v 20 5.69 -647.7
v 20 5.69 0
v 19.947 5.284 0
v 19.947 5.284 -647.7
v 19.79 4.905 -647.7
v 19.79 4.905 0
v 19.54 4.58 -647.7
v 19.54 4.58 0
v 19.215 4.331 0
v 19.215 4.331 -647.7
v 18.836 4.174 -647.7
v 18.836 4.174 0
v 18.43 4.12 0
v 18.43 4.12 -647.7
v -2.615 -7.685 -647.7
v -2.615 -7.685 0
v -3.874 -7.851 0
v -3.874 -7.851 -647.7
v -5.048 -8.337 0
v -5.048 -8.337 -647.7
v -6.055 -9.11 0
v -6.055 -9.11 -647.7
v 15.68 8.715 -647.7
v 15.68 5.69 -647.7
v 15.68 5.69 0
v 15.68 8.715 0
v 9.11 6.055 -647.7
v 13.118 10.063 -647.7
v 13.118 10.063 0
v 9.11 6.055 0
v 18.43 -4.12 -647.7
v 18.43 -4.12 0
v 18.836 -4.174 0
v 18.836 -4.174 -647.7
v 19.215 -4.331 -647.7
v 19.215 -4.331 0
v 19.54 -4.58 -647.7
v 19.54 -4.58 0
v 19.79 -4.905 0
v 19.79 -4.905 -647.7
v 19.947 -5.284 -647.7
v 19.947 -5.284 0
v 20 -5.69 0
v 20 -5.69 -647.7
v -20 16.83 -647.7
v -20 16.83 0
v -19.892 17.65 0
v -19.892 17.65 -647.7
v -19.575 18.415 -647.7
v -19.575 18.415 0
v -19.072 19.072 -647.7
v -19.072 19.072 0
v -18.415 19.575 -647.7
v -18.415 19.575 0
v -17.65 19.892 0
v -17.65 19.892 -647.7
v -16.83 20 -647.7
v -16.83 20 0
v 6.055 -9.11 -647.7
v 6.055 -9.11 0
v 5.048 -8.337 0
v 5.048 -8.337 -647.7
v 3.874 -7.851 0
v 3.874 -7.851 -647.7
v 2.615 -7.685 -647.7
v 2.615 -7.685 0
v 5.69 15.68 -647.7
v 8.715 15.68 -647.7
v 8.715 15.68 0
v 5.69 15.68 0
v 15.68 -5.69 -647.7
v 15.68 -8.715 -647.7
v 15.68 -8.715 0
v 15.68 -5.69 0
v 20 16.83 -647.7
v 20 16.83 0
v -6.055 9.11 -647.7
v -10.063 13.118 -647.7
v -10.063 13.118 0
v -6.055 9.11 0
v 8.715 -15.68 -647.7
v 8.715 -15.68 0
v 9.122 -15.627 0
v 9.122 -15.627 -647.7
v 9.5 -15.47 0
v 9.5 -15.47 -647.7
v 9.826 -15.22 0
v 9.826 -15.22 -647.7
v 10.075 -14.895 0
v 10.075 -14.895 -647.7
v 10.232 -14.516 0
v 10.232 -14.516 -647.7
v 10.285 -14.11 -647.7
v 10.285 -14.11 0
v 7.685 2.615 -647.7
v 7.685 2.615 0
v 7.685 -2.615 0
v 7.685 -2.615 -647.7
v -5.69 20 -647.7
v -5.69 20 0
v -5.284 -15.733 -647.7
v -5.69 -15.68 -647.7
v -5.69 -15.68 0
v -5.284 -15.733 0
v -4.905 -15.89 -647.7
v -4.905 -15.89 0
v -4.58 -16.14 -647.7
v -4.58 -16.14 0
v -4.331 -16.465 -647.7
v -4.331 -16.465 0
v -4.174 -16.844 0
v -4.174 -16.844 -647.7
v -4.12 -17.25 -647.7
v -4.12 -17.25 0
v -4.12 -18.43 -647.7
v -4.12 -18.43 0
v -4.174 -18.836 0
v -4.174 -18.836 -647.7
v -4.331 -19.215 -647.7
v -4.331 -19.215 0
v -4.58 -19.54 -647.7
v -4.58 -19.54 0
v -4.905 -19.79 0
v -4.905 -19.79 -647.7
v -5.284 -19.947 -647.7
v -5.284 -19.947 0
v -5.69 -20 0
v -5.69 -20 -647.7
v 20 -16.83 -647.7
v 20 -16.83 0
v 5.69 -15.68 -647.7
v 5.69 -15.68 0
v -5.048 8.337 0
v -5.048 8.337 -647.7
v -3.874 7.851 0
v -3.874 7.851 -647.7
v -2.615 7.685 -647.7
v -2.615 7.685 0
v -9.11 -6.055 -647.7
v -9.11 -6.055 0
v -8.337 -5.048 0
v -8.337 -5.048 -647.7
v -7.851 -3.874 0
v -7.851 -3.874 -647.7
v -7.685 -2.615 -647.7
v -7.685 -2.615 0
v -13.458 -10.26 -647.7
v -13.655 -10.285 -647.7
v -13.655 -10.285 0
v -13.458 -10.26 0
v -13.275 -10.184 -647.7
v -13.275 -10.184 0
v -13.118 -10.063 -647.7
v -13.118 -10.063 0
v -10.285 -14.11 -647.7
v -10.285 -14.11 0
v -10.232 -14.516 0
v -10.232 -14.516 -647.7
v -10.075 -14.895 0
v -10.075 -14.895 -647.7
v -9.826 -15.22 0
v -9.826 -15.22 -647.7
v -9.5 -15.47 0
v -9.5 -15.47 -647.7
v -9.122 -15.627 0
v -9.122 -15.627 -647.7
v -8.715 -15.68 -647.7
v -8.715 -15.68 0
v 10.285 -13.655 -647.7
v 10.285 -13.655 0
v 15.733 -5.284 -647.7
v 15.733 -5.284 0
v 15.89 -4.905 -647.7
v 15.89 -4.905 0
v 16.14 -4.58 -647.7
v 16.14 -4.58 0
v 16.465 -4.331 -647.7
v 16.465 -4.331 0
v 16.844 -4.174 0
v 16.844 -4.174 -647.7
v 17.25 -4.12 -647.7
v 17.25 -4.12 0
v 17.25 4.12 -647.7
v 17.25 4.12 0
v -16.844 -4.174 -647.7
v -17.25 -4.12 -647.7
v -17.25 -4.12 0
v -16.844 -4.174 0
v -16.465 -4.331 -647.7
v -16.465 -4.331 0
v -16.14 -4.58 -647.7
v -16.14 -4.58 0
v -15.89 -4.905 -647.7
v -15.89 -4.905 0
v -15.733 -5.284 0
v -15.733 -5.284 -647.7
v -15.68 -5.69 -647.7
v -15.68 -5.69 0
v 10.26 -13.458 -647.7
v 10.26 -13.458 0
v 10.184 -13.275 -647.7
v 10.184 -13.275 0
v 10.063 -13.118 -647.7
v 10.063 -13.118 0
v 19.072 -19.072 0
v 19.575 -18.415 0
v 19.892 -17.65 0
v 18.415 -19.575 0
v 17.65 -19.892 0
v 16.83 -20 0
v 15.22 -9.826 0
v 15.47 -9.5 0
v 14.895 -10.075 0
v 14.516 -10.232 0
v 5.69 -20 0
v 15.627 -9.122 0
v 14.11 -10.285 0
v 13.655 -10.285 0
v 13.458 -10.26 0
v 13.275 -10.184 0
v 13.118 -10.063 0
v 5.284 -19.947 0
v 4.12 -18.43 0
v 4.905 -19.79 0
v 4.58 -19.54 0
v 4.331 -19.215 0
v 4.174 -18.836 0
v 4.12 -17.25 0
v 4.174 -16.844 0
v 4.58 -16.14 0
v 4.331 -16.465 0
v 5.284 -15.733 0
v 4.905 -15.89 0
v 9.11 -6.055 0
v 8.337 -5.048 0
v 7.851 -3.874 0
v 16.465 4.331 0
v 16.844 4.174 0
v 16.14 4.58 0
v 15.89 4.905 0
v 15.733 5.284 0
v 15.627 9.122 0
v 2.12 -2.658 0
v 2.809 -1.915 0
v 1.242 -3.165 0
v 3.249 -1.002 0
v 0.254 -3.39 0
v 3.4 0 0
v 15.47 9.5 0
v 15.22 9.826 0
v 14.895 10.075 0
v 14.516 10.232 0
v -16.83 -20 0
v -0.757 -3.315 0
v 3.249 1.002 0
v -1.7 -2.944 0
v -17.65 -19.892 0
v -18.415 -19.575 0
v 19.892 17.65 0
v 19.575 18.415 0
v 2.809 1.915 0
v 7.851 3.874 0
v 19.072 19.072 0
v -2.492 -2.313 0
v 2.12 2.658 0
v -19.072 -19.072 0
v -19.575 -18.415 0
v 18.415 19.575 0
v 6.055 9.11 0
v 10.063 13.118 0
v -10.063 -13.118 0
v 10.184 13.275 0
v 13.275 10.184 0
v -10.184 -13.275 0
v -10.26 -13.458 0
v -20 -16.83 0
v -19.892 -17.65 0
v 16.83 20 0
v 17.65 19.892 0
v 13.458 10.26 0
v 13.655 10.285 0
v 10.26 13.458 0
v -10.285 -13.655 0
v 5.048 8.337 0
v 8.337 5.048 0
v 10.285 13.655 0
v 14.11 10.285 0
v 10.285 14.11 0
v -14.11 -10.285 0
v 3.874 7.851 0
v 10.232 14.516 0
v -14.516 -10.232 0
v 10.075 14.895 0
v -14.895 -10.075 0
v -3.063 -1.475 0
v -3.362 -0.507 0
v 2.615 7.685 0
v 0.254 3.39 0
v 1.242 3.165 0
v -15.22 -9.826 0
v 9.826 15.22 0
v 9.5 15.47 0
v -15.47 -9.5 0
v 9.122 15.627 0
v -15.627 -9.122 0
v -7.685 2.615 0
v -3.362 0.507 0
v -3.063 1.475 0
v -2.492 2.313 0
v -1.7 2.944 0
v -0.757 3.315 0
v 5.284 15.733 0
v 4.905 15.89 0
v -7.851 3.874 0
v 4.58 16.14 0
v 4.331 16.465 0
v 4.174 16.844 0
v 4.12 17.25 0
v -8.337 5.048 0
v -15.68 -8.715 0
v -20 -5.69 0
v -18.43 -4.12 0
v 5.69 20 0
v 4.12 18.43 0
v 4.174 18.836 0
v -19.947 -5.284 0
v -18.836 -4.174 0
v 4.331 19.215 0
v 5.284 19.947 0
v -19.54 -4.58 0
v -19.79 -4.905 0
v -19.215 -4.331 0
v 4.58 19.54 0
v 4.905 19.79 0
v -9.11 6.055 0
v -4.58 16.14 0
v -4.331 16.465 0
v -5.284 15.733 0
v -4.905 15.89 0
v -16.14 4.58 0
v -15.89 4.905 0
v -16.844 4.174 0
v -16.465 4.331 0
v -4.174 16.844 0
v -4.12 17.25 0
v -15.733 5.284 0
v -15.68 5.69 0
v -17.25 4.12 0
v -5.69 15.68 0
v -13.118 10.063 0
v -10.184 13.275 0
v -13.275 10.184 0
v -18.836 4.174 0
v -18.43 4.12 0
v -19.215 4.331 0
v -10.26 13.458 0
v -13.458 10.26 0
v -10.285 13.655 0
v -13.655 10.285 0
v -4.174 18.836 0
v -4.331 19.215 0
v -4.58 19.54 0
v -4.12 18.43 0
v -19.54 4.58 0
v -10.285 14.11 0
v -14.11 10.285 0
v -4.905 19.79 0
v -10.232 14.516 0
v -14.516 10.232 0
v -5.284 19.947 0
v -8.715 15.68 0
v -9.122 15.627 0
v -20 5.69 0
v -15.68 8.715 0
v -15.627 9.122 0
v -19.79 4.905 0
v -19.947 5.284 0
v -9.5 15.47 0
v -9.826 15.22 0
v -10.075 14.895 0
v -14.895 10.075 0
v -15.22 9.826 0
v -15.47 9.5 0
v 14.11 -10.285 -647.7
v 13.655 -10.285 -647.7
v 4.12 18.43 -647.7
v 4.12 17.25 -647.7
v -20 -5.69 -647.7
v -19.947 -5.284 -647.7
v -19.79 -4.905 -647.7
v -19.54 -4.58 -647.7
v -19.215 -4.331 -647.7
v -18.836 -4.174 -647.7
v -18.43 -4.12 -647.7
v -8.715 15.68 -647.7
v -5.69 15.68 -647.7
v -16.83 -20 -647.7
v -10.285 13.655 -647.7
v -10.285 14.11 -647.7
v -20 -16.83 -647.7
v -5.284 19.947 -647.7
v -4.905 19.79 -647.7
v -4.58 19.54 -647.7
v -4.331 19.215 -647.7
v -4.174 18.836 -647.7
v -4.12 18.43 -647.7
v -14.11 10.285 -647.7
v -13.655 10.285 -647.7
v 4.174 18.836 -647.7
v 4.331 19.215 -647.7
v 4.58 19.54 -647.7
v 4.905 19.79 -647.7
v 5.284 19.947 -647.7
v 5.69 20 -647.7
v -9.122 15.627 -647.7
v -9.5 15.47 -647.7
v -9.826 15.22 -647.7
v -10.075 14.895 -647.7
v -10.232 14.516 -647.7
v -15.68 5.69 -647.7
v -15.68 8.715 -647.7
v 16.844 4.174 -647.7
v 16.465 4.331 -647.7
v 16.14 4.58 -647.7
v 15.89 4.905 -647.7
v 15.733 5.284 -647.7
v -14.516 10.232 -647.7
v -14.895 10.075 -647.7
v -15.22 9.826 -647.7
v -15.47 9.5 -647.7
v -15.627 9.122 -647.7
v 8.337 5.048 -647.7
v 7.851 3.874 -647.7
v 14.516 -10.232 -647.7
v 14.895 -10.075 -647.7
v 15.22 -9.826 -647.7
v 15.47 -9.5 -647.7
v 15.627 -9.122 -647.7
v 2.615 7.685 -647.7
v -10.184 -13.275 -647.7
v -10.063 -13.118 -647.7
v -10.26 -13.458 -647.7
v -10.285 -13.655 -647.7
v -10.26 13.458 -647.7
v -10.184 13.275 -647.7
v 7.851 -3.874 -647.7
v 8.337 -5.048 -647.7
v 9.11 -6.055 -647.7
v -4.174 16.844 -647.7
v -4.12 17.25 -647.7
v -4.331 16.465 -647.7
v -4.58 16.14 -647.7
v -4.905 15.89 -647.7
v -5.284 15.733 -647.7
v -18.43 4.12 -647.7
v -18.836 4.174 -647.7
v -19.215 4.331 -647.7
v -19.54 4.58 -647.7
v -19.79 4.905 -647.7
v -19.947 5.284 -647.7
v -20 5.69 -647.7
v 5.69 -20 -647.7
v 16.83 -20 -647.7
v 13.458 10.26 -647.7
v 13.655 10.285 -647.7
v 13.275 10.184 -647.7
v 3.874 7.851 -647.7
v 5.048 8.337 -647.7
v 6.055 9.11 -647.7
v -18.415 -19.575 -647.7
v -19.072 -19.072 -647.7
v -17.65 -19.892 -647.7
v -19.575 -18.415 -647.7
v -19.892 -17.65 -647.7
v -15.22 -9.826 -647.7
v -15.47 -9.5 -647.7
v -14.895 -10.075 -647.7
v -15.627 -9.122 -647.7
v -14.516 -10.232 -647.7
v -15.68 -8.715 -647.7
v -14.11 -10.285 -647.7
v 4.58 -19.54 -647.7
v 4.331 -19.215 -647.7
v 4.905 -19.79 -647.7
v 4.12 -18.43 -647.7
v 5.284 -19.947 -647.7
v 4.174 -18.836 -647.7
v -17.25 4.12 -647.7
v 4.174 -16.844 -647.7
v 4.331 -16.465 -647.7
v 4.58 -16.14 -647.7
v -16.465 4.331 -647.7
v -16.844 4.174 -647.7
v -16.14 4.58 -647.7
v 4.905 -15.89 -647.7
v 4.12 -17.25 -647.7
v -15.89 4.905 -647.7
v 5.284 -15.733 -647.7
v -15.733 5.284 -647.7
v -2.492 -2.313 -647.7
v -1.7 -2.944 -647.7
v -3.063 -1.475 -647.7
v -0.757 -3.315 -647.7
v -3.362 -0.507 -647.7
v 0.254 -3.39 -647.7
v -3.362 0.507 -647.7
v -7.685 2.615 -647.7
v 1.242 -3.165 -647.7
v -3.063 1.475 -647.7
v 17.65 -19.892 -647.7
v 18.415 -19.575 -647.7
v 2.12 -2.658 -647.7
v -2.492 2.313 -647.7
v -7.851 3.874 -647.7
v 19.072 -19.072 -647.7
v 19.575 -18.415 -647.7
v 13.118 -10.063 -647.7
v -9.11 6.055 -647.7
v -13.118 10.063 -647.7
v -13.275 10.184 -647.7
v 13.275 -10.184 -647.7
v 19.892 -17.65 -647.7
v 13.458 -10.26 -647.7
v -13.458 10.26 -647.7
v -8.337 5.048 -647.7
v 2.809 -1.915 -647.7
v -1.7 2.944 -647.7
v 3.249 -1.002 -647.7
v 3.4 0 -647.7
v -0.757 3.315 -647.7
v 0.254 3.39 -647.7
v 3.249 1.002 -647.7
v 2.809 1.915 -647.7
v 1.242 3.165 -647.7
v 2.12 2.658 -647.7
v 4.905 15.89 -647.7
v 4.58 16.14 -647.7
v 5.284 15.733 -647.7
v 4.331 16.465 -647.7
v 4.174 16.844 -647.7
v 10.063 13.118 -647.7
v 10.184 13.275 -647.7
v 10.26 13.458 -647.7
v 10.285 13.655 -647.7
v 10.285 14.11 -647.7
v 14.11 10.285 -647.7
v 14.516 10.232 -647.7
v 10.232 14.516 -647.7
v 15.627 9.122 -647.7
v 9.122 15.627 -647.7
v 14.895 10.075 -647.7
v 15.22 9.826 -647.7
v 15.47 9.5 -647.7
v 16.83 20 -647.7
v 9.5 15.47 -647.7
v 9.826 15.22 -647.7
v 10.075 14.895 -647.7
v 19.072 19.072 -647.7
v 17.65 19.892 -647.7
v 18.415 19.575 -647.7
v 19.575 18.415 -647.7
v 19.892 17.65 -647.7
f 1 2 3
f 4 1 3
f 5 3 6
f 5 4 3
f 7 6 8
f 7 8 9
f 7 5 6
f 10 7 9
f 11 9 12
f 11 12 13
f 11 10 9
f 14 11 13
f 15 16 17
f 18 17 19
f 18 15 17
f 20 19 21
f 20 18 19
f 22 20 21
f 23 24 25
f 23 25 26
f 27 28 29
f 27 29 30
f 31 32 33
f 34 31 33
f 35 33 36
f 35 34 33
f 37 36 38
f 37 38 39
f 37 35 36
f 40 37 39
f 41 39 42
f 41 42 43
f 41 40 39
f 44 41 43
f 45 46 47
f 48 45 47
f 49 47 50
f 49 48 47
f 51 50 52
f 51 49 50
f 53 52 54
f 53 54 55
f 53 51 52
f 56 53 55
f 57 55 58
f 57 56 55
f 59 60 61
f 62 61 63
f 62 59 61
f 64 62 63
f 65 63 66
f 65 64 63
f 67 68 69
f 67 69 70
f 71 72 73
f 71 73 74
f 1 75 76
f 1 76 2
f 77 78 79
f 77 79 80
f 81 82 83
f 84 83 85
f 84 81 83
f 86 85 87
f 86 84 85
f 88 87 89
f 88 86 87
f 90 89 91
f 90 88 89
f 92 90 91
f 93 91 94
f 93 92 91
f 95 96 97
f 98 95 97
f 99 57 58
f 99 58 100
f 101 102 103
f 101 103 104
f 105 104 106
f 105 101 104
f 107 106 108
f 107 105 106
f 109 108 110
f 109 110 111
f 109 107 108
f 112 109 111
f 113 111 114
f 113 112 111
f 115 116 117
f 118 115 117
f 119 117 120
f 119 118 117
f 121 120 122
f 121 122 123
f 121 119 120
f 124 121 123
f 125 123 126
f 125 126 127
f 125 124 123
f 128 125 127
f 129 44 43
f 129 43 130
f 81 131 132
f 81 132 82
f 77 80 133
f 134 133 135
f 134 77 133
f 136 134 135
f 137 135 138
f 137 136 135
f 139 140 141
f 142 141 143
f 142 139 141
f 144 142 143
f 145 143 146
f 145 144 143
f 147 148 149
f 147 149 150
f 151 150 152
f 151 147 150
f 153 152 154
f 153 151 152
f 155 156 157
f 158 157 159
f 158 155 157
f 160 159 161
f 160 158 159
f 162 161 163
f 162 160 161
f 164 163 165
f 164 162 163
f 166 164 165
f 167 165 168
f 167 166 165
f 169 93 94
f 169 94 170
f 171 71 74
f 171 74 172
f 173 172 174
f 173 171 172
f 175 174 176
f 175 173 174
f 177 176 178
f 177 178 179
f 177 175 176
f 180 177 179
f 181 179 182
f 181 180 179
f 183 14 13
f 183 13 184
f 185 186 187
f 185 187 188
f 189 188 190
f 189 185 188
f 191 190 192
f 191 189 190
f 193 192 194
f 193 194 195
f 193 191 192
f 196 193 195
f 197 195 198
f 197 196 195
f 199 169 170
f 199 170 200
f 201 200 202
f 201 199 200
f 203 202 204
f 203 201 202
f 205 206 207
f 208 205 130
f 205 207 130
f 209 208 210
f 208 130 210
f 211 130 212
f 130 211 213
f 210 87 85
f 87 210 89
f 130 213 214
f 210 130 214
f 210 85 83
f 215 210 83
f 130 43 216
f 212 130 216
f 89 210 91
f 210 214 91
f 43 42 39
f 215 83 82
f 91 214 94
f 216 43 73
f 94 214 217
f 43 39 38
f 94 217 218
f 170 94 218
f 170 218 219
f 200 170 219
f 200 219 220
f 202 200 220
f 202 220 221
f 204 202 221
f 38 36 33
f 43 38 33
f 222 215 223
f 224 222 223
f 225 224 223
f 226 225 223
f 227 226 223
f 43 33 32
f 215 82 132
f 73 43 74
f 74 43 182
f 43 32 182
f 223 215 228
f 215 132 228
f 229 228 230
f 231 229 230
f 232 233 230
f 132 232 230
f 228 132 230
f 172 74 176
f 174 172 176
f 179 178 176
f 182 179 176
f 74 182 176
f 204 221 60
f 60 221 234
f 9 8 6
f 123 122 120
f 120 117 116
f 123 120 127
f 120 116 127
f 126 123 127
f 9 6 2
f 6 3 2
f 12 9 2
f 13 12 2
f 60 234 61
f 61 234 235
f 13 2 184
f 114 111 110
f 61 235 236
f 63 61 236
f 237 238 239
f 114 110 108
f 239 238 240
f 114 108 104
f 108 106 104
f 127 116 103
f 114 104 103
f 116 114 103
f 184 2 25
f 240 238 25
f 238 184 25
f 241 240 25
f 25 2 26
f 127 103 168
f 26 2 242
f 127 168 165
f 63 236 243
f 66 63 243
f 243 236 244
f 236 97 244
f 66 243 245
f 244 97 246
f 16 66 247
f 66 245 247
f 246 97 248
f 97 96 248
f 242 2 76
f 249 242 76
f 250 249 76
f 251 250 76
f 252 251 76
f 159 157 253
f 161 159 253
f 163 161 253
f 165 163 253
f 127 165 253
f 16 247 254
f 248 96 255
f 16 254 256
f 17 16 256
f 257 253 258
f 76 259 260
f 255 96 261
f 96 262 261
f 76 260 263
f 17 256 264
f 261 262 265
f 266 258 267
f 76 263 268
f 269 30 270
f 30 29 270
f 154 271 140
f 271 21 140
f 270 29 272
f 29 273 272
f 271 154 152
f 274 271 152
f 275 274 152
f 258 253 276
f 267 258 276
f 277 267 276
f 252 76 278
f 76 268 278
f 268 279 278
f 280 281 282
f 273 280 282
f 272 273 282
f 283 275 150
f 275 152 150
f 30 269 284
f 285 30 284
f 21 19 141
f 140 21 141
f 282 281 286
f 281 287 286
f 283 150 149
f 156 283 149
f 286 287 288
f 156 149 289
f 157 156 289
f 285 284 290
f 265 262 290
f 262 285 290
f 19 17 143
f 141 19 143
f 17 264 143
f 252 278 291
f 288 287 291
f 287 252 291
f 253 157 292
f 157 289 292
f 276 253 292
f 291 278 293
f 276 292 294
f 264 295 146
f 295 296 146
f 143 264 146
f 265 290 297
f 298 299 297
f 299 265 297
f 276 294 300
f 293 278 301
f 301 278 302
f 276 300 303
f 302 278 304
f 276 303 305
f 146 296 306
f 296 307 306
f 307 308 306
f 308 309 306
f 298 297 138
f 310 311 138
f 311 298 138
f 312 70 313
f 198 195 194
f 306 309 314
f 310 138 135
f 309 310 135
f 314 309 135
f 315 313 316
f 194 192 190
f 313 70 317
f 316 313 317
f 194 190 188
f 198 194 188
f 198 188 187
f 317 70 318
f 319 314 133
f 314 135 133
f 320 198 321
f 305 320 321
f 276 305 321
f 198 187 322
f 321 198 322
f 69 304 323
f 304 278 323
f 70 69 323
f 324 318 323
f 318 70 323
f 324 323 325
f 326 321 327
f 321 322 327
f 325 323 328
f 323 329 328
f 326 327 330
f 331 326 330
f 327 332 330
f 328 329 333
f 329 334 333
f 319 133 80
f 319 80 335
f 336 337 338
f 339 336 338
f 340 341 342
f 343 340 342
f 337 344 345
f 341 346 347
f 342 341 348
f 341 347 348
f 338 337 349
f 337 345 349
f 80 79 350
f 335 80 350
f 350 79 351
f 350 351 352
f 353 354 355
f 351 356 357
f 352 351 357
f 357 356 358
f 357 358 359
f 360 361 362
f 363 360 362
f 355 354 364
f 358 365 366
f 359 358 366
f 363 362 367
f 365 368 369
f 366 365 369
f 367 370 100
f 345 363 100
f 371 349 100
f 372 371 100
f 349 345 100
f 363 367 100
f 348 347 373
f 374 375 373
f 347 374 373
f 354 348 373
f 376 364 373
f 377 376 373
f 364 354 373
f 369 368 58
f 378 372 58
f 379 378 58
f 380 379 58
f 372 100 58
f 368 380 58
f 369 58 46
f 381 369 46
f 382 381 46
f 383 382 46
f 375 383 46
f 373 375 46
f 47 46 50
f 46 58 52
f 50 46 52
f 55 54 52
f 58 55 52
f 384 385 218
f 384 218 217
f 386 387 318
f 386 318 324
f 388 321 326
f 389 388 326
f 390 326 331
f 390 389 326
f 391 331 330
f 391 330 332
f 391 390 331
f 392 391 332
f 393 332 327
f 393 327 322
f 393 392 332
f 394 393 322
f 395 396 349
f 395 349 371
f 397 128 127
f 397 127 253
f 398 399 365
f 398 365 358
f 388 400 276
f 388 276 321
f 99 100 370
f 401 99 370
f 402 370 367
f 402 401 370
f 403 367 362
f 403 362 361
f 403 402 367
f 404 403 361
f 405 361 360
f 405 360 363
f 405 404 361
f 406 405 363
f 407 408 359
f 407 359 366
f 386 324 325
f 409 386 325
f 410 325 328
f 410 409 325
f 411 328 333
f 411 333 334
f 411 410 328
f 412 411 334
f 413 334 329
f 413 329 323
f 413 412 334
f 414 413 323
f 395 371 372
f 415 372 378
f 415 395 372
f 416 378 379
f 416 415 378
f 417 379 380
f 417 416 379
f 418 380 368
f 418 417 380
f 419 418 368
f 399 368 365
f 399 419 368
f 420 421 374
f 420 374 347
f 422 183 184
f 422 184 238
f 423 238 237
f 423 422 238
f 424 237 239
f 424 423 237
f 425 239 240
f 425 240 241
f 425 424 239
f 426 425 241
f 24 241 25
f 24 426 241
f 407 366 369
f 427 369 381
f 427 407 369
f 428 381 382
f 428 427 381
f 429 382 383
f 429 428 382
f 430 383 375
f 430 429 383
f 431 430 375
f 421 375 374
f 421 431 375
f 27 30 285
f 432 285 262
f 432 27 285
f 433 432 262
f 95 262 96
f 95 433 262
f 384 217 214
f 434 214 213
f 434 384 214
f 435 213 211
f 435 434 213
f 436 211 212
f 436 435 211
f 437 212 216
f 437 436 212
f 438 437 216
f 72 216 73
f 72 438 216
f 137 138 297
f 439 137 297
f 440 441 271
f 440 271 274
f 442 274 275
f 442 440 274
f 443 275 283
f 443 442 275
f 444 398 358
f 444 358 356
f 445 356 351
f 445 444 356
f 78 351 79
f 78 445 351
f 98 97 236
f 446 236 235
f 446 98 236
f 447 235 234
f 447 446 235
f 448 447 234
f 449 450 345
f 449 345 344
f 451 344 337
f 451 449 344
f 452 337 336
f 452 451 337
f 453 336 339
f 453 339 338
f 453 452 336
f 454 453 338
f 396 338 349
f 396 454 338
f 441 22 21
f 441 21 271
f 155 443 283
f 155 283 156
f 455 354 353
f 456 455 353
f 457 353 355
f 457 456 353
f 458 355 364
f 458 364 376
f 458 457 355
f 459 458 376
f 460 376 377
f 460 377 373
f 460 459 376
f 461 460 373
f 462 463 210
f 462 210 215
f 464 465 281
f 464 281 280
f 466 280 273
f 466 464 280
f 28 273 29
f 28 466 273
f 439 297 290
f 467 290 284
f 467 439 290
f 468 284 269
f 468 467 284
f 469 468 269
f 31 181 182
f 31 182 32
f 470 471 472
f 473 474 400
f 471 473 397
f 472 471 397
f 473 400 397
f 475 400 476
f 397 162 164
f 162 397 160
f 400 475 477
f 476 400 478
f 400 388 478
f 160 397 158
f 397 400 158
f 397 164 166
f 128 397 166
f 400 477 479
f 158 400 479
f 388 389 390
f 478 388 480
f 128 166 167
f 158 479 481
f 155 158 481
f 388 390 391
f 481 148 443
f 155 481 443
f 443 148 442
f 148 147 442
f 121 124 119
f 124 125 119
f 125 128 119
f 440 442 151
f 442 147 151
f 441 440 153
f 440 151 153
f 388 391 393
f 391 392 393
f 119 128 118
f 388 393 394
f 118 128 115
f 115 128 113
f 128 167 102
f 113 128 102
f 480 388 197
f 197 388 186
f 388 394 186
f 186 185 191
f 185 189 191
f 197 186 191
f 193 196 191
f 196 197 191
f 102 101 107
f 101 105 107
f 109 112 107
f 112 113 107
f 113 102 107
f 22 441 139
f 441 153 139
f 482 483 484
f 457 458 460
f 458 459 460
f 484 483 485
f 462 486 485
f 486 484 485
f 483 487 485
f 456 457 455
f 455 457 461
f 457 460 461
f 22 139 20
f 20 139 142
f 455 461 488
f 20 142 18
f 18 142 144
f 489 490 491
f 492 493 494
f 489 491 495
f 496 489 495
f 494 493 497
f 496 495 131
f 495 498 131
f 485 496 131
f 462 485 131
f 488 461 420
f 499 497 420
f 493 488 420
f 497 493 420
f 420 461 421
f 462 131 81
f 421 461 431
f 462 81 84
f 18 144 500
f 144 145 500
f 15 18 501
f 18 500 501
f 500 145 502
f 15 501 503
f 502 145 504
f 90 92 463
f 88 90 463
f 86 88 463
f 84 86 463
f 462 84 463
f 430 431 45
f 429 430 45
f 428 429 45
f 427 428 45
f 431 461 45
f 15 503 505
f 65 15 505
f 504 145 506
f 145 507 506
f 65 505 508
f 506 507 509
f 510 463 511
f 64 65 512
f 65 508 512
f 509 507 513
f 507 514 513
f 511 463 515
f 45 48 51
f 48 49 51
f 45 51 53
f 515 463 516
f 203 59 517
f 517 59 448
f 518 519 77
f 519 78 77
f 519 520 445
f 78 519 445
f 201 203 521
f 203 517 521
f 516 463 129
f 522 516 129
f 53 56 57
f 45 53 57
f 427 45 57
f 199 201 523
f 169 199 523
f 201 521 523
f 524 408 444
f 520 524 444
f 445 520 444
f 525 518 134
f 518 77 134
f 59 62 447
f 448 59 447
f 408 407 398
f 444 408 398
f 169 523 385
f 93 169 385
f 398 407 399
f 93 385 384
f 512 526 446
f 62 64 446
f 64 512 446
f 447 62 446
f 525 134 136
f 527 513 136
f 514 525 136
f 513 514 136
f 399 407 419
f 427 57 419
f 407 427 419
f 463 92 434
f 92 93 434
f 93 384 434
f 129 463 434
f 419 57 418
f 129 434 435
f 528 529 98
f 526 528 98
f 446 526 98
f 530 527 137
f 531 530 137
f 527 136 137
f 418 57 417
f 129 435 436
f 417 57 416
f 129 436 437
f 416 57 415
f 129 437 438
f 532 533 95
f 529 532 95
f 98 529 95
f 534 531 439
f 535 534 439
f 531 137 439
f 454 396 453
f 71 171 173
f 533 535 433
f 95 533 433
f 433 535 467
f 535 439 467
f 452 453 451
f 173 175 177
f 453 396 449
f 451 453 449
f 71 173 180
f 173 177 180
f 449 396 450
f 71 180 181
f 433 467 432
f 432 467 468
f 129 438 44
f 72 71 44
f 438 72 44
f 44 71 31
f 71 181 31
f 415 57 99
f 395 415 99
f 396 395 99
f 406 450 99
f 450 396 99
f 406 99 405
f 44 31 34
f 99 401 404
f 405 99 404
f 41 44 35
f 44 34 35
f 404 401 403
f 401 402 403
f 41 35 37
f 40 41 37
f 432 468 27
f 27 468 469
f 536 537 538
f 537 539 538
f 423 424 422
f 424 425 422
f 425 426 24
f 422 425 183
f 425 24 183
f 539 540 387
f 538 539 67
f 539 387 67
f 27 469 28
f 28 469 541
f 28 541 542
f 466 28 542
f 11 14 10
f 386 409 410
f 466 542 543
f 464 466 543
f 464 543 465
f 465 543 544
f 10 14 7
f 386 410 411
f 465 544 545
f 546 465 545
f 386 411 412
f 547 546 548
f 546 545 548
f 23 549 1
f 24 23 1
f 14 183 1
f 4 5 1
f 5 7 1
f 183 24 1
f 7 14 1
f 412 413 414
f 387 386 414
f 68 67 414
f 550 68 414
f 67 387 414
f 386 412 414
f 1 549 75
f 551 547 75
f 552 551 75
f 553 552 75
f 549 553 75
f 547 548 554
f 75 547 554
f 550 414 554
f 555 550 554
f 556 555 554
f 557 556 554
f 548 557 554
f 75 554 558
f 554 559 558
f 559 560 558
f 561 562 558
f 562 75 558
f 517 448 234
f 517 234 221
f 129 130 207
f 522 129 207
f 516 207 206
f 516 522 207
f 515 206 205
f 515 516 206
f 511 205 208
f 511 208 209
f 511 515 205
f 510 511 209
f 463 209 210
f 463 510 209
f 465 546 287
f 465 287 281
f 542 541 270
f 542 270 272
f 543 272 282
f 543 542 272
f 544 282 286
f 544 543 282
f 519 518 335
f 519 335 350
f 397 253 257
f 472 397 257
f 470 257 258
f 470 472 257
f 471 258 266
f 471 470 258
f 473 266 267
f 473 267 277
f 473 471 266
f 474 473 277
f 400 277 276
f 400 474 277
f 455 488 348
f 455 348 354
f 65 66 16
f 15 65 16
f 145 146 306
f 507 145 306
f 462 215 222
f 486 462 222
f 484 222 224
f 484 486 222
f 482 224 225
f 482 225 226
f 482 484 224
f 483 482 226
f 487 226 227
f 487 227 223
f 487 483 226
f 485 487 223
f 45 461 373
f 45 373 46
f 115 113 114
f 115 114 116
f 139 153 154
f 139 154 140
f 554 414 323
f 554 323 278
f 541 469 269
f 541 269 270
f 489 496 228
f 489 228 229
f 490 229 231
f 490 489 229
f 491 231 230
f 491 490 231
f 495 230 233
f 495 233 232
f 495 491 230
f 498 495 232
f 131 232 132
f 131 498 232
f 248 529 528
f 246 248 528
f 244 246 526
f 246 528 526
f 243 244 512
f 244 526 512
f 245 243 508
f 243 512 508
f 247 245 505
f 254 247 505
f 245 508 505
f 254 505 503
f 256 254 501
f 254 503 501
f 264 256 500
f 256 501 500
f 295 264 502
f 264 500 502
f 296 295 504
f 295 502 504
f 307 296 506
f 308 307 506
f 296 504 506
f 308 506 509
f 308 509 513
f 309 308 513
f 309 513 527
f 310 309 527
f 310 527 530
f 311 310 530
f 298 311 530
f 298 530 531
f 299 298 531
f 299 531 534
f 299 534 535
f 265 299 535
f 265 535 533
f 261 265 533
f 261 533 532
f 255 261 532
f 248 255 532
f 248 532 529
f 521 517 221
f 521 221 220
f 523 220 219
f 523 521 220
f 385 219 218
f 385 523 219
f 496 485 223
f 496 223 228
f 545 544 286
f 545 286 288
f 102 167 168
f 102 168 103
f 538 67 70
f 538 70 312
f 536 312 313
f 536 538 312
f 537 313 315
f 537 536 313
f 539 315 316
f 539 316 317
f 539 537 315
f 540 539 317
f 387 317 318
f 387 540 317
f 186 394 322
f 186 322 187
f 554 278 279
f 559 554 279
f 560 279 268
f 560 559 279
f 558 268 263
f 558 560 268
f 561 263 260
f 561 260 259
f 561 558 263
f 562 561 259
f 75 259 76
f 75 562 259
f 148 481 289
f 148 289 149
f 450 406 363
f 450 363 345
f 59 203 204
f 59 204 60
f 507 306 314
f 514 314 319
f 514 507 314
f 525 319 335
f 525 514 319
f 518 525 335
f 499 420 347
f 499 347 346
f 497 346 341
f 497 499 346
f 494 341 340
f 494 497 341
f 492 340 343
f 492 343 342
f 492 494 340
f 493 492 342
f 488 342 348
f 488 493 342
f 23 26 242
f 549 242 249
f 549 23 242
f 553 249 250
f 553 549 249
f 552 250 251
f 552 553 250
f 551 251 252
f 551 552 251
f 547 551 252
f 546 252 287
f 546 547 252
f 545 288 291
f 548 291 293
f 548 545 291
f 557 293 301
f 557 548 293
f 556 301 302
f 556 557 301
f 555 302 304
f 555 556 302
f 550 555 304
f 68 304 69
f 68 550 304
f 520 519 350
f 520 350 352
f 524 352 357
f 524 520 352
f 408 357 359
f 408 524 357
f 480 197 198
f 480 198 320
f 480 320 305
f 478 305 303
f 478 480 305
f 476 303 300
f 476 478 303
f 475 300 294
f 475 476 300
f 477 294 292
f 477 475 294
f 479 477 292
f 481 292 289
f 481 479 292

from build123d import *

# Parameters (mm, degrees)
SKETCH1_R           = 3.4
BOSS_EXTRUDE1_DEPTH = 4000
SKETCH2_W           = 240.449275058
SKETCH2_H           = 182.715753948
CUT_EXTRUDE1_DEPTH  = 3353.41931894


with BuildPart() as part:
    # Sketch1 → Boss-Extrude1 (new body)
    with BuildSketch(Plane(origin=(0, 0, -4000), x_dir=(-1, 0, 0), z_dir=(0, 0, -1))):
        with BuildLine():
            Line((16.83, 20), (5.69044933, 20))
            ThreePointArc((5.69044933, 20), (4.580291684, 19.540157646), (4.12044933, 18.43))
            Line((4.12044933, 18.43), (4.12044933, 17.25))
            ThreePointArc((4.12044933, 17.25), (4.580291684, 16.139842354), (5.69044933, 15.68))
            Line((5.69044933, 15.68), (8.7153995, 15.68))
            ThreePointArc((8.7153995, 15.68), (9.825557146, 15.220157646), (10.2853995, 14.11))
            Line((10.2853995, 14.11), (10.2853995, 13.654903102))
            ThreePointArc((10.2853995, 13.654903102), (10.227547945, 13.364063694), (10.062800654, 13.117501948))
            Line((10.062800654, 13.117501948), (6.055092794, 9.109794088))
            ThreePointArc((6.055092794, 9.109794088), (4.47691877, 8.055291919), (2.615335582, 7.685))
            Line((2.615335582, 7.685), (-2.615335582, 7.685))
            ThreePointArc((-2.615335582, 7.685), (-4.47691877, 8.055291919), (-6.055092794, 9.109794088))
            Line((-6.055092794, 9.109794088), (-10.062800654, 13.117501948))
            ThreePointArc((-10.062800654, 13.117501948), (-10.227547945, 13.364063694), (-10.2853995, 13.654903102))
            Line((-10.2853995, 13.654903102), (-10.2853995, 14.11))
            ThreePointArc((-10.2853995, 14.11), (-9.825557146, 15.220157646), (-8.7153995, 15.68))
            Line((-8.7153995, 15.68), (-5.69044933, 15.68))
            ThreePointArc((-5.69044933, 15.68), (-4.580291684, 16.139842354), (-4.12044933, 17.25))
            Line((-4.12044933, 17.25), (-4.12044933, 18.43))
            ThreePointArc((-4.12044933, 18.43), (-4.580291684, 19.540157646), (-5.69044933, 20))
            Line((-5.69044933, 20), (-16.83, 20))
            ThreePointArc((-16.83, 20), (-19.071528496, 19.071528496), (-20, 16.83))
            Line((-20, 16.83), (-20, 5.69044933))
            ThreePointArc((-20, 5.69044933), (-19.540157646, 4.580291684), (-18.43, 4.12044933))
            Line((-18.43, 4.12044933), (-17.25, 4.12044933))
            ThreePointArc((-17.25, 4.12044933), (-16.139842354, 4.580291684), (-15.68, 5.69044933))
            Line((-15.68, 5.69044933), (-15.68, 8.7153995))
            ThreePointArc((-15.68, 8.7153995), (-15.220157646, 9.825557146), (-14.11, 10.2853995))
            Line((-14.11, 10.2853995), (-13.654903102, 10.2853995))
            ThreePointArc((-13.654903102, 10.2853995), (-13.364063694, 10.227547945), (-13.117501948, 10.062800654))
            Line((-13.117501948, 10.062800654), (-9.109794088, 6.055092794))
            ThreePointArc((-9.109794088, 6.055092794), (-8.055291919, 4.47691877), (-7.685, 2.615335582))
            Line((-7.685, 2.615335582), (-7.685, -2.615335582))
            ThreePointArc((-7.685, -2.615335582), (-8.055291919, -4.47691877), (-9.109794088, -6.055092794))
            Line((-9.109794088, -6.055092794), (-13.117501948, -10.062800654))
            ThreePointArc((-13.117501948, -10.062800654), (-13.364063694, -10.227547945), (-13.654903102, -10.2853995))
            Line((-13.654903102, -10.2853995), (-14.11, -10.2853995))
            ThreePointArc((-14.11, -10.2853995), (-15.220157646, -9.825557146), (-15.68, -8.7153995))
            Line((-15.68, -8.7153995), (-15.68, -5.69044933))
            ThreePointArc((-15.68, -5.69044933), (-16.139842354, -4.580291684), (-17.25, -4.12044933))
            Line((-17.25, -4.12044933), (-18.43, -4.12044933))
            ThreePointArc((-18.43, -4.12044933), (-19.540157646, -4.580291684), (-20, -5.69044933))
            Line((-20, -5.69044933), (-20, -16.83))
            ThreePointArc((-20, -16.83), (-19.071528496, -19.071528496), (-16.83, -20))
            Line((-16.83, -20), (-5.69044933, -20))
            ThreePointArc((-5.69044933, -20), (-4.580291684, -19.540157646), (-4.12044933, -18.43))
            Line((-4.12044933, -18.43), (-4.12044933, -17.25))
            ThreePointArc((-4.12044933, -17.25), (-4.580291684, -16.139842354), (-5.69044933, -15.68))
            Line((-5.69044933, -15.68), (-8.7153995, -15.68))
            ThreePointArc((-8.7153995, -15.68), (-9.825557146, -15.220157646), (-10.2853995, -14.11))
            Line((-10.2853995, -14.11), (-10.2853995, -13.654903102))
            ThreePointArc((-10.2853995, -13.654903102), (-10.227547945, -13.364063694), (-10.062800654, -13.117501948))
            Line((-10.062800654, -13.117501948), (-6.055092794, -9.109794088))
            ThreePointArc((-6.055092794, -9.109794088), (-4.47691877, -8.055291919), (-2.615335582, -7.685))
            Line((-2.615335582, -7.685), (2.615335582, -7.685))
            ThreePointArc((2.615335582, -7.685), (4.47691877, -8.055291919), (6.055092794, -9.109794088))
            Line((6.055092794, -9.109794088), (10.062800654, -13.117501948))
            ThreePointArc((10.062800654, -13.117501948), (10.227547945, -13.364063694), (10.2853995, -13.654903102))
            Line((10.2853995, -13.654903102), (10.2853995, -14.11))
            ThreePointArc((10.2853995, -14.11), (9.825557146, -15.220157646), (8.7153995, -15.68))
            Line((8.7153995, -15.68), (5.69044933, -15.68))
            ThreePointArc((5.69044933, -15.68), (4.580291684, -16.139842354), (4.12044933, -17.25))
            Line((4.12044933, -17.25), (4.12044933, -18.43))
            ThreePointArc((4.12044933, -18.43), (4.580291684, -19.540157646), (5.69044933, -20))
            Line((5.69044933, -20), (16.83, -20))
            ThreePointArc((16.83, -20), (19.071528496, -19.071528496), (20, -16.83))
            Line((20, -16.83), (20, -5.69044933))
            ThreePointArc((20, -5.69044933), (19.540157646, -4.580291684), (18.43, -4.12044933))
            Line((18.43, -4.12044933), (17.25, -4.12044933))
            ThreePointArc((17.25, -4.12044933), (16.139842354, -4.580291684), (15.68, -5.69044933))
            Line((15.68, -5.69044933), (15.68, -8.7153995))
            ThreePointArc((15.68, -8.7153995), (15.220157646, -9.825557146), (14.11, -10.2853995))
            Line((14.11, -10.2853995), (13.654903102, -10.2853995))
            ThreePointArc((13.654903102, -10.2853995), (13.364063694, -10.227547945), (13.117501948, -10.062800654))
            Line((13.117501948, -10.062800654), (9.109794088, -6.055092794))
            ThreePointArc((9.109794088, -6.055092794), (8.055291919, -4.47691877), (7.685, -2.615335582))
            Line((7.685, -2.615335582), (7.685, 2.615335582))
            ThreePointArc((7.685, 2.615335582), (8.055291919, 4.47691877), (9.109794088, 6.055092794))
            Line((9.109794088, 6.055092794), (13.117501948, 10.062800654))
            ThreePointArc((13.117501948, 10.062800654), (13.364063694, 10.227547945), (13.654903102, 10.2853995))
            Line((13.654903102, 10.2853995), (14.11, 10.2853995))
            ThreePointArc((14.11, 10.2853995), (15.220157646, 9.825557146), (15.68, 8.7153995))
            Line((15.68, 8.7153995), (15.68, 5.69044933))
            ThreePointArc((15.68, 5.69044933), (16.139842354, 4.580291684), (17.25, 4.12044933))
            Line((17.25, 4.12044933), (18.43, 4.12044933))
            ThreePointArc((18.43, 4.12044933), (19.540157646, 4.580291684), (20, 5.69044933))
            Line((20, 5.69044933), (20, 16.83))
            ThreePointArc((20, 16.83), (19.071528496, 19.071528496), (16.83, 20))
        make_face()
        with Locations(Location((0, 0, 0), (0, 0, 180))):
            Circle(SKETCH1_R, mode=Mode.SUBTRACT)
    extrude(amount=-BOSS_EXTRUDE1_DEPTH)

    # Sketch2 → Cut-Extrude1 (cut, through all)
    with BuildSketch(Plane.XY.offset(-647.7)):
        Rectangle(SKETCH2_W, SKETCH2_H)
    extrude(amount=-CUT_EXTRUDE1_DEPTH, mode=Mode.SUBTRACT)


solid = part.part
